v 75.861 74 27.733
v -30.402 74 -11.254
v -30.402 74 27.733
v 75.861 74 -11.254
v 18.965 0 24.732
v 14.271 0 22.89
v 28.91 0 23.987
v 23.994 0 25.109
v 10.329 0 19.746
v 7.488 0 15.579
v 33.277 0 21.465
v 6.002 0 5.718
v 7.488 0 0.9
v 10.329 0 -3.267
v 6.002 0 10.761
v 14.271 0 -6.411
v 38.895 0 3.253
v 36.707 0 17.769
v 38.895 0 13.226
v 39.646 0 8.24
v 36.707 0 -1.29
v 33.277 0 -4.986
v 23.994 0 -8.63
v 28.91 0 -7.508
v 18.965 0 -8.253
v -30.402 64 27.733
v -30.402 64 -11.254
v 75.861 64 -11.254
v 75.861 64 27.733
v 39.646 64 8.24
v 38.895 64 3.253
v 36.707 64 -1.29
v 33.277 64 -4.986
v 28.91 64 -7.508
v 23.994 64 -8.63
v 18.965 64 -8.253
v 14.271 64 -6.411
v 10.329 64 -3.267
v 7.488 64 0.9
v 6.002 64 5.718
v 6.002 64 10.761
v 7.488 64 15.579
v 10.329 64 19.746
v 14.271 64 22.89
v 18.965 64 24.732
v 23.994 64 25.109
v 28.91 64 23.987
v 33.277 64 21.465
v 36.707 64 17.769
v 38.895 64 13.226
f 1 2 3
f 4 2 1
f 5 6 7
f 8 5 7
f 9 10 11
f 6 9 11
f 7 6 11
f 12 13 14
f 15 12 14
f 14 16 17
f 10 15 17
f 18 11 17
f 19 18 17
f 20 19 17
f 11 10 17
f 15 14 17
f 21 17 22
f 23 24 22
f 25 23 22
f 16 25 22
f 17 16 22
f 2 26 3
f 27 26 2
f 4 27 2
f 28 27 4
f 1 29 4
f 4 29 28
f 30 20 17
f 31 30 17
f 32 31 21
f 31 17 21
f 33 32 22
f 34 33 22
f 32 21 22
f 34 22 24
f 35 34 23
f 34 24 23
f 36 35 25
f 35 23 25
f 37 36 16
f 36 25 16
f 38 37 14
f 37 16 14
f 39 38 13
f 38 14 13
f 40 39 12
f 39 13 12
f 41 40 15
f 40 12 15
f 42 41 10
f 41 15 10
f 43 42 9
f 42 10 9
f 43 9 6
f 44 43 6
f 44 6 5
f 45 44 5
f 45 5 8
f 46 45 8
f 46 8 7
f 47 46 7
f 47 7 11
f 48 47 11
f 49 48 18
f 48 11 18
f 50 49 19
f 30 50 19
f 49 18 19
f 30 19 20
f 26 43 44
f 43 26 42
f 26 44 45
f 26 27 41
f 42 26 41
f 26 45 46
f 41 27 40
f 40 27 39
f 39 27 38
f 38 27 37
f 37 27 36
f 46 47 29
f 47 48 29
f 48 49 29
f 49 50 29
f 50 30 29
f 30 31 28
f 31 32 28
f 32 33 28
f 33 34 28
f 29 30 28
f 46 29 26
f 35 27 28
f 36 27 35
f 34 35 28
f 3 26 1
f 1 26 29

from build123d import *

# Parameters (mm, degrees)
SKETCH1_R           = 16.916621232
BOSS_EXTRUDE1_DEPTH = 64
SKETCH2_W           = 106.262974488
SKETCH2_H           = 38.987679284
BOSS_EXTRUDE2_DEPTH = 10


with BuildPart() as part:
    # Sketch1 → Boss-Extrude1 (new body)
    with BuildSketch(Plane(origin=(0, 0, 0), x_dir=(1, 0, 0), z_dir=(0, 1, 0))):
        with Locations((22.72979363, -8.239550191)):
            Circle(SKETCH1_R)
    extrude(amount=BOSS_EXTRUDE1_DEPTH)

    # Sketch2 → Boss-Extrude2 (add)
    with BuildSketch(Plane(origin=(0, 64, 0), x_dir=(1, 0, 0), z_dir=(0, 1, 0))):
        with Locations((22.72979363, -8.239550191)):
            Rectangle(SKETCH2_W, SKETCH2_H)
    extrude(amount=BOSS_EXTRUDE2_DEPTH)


solid = part.part
